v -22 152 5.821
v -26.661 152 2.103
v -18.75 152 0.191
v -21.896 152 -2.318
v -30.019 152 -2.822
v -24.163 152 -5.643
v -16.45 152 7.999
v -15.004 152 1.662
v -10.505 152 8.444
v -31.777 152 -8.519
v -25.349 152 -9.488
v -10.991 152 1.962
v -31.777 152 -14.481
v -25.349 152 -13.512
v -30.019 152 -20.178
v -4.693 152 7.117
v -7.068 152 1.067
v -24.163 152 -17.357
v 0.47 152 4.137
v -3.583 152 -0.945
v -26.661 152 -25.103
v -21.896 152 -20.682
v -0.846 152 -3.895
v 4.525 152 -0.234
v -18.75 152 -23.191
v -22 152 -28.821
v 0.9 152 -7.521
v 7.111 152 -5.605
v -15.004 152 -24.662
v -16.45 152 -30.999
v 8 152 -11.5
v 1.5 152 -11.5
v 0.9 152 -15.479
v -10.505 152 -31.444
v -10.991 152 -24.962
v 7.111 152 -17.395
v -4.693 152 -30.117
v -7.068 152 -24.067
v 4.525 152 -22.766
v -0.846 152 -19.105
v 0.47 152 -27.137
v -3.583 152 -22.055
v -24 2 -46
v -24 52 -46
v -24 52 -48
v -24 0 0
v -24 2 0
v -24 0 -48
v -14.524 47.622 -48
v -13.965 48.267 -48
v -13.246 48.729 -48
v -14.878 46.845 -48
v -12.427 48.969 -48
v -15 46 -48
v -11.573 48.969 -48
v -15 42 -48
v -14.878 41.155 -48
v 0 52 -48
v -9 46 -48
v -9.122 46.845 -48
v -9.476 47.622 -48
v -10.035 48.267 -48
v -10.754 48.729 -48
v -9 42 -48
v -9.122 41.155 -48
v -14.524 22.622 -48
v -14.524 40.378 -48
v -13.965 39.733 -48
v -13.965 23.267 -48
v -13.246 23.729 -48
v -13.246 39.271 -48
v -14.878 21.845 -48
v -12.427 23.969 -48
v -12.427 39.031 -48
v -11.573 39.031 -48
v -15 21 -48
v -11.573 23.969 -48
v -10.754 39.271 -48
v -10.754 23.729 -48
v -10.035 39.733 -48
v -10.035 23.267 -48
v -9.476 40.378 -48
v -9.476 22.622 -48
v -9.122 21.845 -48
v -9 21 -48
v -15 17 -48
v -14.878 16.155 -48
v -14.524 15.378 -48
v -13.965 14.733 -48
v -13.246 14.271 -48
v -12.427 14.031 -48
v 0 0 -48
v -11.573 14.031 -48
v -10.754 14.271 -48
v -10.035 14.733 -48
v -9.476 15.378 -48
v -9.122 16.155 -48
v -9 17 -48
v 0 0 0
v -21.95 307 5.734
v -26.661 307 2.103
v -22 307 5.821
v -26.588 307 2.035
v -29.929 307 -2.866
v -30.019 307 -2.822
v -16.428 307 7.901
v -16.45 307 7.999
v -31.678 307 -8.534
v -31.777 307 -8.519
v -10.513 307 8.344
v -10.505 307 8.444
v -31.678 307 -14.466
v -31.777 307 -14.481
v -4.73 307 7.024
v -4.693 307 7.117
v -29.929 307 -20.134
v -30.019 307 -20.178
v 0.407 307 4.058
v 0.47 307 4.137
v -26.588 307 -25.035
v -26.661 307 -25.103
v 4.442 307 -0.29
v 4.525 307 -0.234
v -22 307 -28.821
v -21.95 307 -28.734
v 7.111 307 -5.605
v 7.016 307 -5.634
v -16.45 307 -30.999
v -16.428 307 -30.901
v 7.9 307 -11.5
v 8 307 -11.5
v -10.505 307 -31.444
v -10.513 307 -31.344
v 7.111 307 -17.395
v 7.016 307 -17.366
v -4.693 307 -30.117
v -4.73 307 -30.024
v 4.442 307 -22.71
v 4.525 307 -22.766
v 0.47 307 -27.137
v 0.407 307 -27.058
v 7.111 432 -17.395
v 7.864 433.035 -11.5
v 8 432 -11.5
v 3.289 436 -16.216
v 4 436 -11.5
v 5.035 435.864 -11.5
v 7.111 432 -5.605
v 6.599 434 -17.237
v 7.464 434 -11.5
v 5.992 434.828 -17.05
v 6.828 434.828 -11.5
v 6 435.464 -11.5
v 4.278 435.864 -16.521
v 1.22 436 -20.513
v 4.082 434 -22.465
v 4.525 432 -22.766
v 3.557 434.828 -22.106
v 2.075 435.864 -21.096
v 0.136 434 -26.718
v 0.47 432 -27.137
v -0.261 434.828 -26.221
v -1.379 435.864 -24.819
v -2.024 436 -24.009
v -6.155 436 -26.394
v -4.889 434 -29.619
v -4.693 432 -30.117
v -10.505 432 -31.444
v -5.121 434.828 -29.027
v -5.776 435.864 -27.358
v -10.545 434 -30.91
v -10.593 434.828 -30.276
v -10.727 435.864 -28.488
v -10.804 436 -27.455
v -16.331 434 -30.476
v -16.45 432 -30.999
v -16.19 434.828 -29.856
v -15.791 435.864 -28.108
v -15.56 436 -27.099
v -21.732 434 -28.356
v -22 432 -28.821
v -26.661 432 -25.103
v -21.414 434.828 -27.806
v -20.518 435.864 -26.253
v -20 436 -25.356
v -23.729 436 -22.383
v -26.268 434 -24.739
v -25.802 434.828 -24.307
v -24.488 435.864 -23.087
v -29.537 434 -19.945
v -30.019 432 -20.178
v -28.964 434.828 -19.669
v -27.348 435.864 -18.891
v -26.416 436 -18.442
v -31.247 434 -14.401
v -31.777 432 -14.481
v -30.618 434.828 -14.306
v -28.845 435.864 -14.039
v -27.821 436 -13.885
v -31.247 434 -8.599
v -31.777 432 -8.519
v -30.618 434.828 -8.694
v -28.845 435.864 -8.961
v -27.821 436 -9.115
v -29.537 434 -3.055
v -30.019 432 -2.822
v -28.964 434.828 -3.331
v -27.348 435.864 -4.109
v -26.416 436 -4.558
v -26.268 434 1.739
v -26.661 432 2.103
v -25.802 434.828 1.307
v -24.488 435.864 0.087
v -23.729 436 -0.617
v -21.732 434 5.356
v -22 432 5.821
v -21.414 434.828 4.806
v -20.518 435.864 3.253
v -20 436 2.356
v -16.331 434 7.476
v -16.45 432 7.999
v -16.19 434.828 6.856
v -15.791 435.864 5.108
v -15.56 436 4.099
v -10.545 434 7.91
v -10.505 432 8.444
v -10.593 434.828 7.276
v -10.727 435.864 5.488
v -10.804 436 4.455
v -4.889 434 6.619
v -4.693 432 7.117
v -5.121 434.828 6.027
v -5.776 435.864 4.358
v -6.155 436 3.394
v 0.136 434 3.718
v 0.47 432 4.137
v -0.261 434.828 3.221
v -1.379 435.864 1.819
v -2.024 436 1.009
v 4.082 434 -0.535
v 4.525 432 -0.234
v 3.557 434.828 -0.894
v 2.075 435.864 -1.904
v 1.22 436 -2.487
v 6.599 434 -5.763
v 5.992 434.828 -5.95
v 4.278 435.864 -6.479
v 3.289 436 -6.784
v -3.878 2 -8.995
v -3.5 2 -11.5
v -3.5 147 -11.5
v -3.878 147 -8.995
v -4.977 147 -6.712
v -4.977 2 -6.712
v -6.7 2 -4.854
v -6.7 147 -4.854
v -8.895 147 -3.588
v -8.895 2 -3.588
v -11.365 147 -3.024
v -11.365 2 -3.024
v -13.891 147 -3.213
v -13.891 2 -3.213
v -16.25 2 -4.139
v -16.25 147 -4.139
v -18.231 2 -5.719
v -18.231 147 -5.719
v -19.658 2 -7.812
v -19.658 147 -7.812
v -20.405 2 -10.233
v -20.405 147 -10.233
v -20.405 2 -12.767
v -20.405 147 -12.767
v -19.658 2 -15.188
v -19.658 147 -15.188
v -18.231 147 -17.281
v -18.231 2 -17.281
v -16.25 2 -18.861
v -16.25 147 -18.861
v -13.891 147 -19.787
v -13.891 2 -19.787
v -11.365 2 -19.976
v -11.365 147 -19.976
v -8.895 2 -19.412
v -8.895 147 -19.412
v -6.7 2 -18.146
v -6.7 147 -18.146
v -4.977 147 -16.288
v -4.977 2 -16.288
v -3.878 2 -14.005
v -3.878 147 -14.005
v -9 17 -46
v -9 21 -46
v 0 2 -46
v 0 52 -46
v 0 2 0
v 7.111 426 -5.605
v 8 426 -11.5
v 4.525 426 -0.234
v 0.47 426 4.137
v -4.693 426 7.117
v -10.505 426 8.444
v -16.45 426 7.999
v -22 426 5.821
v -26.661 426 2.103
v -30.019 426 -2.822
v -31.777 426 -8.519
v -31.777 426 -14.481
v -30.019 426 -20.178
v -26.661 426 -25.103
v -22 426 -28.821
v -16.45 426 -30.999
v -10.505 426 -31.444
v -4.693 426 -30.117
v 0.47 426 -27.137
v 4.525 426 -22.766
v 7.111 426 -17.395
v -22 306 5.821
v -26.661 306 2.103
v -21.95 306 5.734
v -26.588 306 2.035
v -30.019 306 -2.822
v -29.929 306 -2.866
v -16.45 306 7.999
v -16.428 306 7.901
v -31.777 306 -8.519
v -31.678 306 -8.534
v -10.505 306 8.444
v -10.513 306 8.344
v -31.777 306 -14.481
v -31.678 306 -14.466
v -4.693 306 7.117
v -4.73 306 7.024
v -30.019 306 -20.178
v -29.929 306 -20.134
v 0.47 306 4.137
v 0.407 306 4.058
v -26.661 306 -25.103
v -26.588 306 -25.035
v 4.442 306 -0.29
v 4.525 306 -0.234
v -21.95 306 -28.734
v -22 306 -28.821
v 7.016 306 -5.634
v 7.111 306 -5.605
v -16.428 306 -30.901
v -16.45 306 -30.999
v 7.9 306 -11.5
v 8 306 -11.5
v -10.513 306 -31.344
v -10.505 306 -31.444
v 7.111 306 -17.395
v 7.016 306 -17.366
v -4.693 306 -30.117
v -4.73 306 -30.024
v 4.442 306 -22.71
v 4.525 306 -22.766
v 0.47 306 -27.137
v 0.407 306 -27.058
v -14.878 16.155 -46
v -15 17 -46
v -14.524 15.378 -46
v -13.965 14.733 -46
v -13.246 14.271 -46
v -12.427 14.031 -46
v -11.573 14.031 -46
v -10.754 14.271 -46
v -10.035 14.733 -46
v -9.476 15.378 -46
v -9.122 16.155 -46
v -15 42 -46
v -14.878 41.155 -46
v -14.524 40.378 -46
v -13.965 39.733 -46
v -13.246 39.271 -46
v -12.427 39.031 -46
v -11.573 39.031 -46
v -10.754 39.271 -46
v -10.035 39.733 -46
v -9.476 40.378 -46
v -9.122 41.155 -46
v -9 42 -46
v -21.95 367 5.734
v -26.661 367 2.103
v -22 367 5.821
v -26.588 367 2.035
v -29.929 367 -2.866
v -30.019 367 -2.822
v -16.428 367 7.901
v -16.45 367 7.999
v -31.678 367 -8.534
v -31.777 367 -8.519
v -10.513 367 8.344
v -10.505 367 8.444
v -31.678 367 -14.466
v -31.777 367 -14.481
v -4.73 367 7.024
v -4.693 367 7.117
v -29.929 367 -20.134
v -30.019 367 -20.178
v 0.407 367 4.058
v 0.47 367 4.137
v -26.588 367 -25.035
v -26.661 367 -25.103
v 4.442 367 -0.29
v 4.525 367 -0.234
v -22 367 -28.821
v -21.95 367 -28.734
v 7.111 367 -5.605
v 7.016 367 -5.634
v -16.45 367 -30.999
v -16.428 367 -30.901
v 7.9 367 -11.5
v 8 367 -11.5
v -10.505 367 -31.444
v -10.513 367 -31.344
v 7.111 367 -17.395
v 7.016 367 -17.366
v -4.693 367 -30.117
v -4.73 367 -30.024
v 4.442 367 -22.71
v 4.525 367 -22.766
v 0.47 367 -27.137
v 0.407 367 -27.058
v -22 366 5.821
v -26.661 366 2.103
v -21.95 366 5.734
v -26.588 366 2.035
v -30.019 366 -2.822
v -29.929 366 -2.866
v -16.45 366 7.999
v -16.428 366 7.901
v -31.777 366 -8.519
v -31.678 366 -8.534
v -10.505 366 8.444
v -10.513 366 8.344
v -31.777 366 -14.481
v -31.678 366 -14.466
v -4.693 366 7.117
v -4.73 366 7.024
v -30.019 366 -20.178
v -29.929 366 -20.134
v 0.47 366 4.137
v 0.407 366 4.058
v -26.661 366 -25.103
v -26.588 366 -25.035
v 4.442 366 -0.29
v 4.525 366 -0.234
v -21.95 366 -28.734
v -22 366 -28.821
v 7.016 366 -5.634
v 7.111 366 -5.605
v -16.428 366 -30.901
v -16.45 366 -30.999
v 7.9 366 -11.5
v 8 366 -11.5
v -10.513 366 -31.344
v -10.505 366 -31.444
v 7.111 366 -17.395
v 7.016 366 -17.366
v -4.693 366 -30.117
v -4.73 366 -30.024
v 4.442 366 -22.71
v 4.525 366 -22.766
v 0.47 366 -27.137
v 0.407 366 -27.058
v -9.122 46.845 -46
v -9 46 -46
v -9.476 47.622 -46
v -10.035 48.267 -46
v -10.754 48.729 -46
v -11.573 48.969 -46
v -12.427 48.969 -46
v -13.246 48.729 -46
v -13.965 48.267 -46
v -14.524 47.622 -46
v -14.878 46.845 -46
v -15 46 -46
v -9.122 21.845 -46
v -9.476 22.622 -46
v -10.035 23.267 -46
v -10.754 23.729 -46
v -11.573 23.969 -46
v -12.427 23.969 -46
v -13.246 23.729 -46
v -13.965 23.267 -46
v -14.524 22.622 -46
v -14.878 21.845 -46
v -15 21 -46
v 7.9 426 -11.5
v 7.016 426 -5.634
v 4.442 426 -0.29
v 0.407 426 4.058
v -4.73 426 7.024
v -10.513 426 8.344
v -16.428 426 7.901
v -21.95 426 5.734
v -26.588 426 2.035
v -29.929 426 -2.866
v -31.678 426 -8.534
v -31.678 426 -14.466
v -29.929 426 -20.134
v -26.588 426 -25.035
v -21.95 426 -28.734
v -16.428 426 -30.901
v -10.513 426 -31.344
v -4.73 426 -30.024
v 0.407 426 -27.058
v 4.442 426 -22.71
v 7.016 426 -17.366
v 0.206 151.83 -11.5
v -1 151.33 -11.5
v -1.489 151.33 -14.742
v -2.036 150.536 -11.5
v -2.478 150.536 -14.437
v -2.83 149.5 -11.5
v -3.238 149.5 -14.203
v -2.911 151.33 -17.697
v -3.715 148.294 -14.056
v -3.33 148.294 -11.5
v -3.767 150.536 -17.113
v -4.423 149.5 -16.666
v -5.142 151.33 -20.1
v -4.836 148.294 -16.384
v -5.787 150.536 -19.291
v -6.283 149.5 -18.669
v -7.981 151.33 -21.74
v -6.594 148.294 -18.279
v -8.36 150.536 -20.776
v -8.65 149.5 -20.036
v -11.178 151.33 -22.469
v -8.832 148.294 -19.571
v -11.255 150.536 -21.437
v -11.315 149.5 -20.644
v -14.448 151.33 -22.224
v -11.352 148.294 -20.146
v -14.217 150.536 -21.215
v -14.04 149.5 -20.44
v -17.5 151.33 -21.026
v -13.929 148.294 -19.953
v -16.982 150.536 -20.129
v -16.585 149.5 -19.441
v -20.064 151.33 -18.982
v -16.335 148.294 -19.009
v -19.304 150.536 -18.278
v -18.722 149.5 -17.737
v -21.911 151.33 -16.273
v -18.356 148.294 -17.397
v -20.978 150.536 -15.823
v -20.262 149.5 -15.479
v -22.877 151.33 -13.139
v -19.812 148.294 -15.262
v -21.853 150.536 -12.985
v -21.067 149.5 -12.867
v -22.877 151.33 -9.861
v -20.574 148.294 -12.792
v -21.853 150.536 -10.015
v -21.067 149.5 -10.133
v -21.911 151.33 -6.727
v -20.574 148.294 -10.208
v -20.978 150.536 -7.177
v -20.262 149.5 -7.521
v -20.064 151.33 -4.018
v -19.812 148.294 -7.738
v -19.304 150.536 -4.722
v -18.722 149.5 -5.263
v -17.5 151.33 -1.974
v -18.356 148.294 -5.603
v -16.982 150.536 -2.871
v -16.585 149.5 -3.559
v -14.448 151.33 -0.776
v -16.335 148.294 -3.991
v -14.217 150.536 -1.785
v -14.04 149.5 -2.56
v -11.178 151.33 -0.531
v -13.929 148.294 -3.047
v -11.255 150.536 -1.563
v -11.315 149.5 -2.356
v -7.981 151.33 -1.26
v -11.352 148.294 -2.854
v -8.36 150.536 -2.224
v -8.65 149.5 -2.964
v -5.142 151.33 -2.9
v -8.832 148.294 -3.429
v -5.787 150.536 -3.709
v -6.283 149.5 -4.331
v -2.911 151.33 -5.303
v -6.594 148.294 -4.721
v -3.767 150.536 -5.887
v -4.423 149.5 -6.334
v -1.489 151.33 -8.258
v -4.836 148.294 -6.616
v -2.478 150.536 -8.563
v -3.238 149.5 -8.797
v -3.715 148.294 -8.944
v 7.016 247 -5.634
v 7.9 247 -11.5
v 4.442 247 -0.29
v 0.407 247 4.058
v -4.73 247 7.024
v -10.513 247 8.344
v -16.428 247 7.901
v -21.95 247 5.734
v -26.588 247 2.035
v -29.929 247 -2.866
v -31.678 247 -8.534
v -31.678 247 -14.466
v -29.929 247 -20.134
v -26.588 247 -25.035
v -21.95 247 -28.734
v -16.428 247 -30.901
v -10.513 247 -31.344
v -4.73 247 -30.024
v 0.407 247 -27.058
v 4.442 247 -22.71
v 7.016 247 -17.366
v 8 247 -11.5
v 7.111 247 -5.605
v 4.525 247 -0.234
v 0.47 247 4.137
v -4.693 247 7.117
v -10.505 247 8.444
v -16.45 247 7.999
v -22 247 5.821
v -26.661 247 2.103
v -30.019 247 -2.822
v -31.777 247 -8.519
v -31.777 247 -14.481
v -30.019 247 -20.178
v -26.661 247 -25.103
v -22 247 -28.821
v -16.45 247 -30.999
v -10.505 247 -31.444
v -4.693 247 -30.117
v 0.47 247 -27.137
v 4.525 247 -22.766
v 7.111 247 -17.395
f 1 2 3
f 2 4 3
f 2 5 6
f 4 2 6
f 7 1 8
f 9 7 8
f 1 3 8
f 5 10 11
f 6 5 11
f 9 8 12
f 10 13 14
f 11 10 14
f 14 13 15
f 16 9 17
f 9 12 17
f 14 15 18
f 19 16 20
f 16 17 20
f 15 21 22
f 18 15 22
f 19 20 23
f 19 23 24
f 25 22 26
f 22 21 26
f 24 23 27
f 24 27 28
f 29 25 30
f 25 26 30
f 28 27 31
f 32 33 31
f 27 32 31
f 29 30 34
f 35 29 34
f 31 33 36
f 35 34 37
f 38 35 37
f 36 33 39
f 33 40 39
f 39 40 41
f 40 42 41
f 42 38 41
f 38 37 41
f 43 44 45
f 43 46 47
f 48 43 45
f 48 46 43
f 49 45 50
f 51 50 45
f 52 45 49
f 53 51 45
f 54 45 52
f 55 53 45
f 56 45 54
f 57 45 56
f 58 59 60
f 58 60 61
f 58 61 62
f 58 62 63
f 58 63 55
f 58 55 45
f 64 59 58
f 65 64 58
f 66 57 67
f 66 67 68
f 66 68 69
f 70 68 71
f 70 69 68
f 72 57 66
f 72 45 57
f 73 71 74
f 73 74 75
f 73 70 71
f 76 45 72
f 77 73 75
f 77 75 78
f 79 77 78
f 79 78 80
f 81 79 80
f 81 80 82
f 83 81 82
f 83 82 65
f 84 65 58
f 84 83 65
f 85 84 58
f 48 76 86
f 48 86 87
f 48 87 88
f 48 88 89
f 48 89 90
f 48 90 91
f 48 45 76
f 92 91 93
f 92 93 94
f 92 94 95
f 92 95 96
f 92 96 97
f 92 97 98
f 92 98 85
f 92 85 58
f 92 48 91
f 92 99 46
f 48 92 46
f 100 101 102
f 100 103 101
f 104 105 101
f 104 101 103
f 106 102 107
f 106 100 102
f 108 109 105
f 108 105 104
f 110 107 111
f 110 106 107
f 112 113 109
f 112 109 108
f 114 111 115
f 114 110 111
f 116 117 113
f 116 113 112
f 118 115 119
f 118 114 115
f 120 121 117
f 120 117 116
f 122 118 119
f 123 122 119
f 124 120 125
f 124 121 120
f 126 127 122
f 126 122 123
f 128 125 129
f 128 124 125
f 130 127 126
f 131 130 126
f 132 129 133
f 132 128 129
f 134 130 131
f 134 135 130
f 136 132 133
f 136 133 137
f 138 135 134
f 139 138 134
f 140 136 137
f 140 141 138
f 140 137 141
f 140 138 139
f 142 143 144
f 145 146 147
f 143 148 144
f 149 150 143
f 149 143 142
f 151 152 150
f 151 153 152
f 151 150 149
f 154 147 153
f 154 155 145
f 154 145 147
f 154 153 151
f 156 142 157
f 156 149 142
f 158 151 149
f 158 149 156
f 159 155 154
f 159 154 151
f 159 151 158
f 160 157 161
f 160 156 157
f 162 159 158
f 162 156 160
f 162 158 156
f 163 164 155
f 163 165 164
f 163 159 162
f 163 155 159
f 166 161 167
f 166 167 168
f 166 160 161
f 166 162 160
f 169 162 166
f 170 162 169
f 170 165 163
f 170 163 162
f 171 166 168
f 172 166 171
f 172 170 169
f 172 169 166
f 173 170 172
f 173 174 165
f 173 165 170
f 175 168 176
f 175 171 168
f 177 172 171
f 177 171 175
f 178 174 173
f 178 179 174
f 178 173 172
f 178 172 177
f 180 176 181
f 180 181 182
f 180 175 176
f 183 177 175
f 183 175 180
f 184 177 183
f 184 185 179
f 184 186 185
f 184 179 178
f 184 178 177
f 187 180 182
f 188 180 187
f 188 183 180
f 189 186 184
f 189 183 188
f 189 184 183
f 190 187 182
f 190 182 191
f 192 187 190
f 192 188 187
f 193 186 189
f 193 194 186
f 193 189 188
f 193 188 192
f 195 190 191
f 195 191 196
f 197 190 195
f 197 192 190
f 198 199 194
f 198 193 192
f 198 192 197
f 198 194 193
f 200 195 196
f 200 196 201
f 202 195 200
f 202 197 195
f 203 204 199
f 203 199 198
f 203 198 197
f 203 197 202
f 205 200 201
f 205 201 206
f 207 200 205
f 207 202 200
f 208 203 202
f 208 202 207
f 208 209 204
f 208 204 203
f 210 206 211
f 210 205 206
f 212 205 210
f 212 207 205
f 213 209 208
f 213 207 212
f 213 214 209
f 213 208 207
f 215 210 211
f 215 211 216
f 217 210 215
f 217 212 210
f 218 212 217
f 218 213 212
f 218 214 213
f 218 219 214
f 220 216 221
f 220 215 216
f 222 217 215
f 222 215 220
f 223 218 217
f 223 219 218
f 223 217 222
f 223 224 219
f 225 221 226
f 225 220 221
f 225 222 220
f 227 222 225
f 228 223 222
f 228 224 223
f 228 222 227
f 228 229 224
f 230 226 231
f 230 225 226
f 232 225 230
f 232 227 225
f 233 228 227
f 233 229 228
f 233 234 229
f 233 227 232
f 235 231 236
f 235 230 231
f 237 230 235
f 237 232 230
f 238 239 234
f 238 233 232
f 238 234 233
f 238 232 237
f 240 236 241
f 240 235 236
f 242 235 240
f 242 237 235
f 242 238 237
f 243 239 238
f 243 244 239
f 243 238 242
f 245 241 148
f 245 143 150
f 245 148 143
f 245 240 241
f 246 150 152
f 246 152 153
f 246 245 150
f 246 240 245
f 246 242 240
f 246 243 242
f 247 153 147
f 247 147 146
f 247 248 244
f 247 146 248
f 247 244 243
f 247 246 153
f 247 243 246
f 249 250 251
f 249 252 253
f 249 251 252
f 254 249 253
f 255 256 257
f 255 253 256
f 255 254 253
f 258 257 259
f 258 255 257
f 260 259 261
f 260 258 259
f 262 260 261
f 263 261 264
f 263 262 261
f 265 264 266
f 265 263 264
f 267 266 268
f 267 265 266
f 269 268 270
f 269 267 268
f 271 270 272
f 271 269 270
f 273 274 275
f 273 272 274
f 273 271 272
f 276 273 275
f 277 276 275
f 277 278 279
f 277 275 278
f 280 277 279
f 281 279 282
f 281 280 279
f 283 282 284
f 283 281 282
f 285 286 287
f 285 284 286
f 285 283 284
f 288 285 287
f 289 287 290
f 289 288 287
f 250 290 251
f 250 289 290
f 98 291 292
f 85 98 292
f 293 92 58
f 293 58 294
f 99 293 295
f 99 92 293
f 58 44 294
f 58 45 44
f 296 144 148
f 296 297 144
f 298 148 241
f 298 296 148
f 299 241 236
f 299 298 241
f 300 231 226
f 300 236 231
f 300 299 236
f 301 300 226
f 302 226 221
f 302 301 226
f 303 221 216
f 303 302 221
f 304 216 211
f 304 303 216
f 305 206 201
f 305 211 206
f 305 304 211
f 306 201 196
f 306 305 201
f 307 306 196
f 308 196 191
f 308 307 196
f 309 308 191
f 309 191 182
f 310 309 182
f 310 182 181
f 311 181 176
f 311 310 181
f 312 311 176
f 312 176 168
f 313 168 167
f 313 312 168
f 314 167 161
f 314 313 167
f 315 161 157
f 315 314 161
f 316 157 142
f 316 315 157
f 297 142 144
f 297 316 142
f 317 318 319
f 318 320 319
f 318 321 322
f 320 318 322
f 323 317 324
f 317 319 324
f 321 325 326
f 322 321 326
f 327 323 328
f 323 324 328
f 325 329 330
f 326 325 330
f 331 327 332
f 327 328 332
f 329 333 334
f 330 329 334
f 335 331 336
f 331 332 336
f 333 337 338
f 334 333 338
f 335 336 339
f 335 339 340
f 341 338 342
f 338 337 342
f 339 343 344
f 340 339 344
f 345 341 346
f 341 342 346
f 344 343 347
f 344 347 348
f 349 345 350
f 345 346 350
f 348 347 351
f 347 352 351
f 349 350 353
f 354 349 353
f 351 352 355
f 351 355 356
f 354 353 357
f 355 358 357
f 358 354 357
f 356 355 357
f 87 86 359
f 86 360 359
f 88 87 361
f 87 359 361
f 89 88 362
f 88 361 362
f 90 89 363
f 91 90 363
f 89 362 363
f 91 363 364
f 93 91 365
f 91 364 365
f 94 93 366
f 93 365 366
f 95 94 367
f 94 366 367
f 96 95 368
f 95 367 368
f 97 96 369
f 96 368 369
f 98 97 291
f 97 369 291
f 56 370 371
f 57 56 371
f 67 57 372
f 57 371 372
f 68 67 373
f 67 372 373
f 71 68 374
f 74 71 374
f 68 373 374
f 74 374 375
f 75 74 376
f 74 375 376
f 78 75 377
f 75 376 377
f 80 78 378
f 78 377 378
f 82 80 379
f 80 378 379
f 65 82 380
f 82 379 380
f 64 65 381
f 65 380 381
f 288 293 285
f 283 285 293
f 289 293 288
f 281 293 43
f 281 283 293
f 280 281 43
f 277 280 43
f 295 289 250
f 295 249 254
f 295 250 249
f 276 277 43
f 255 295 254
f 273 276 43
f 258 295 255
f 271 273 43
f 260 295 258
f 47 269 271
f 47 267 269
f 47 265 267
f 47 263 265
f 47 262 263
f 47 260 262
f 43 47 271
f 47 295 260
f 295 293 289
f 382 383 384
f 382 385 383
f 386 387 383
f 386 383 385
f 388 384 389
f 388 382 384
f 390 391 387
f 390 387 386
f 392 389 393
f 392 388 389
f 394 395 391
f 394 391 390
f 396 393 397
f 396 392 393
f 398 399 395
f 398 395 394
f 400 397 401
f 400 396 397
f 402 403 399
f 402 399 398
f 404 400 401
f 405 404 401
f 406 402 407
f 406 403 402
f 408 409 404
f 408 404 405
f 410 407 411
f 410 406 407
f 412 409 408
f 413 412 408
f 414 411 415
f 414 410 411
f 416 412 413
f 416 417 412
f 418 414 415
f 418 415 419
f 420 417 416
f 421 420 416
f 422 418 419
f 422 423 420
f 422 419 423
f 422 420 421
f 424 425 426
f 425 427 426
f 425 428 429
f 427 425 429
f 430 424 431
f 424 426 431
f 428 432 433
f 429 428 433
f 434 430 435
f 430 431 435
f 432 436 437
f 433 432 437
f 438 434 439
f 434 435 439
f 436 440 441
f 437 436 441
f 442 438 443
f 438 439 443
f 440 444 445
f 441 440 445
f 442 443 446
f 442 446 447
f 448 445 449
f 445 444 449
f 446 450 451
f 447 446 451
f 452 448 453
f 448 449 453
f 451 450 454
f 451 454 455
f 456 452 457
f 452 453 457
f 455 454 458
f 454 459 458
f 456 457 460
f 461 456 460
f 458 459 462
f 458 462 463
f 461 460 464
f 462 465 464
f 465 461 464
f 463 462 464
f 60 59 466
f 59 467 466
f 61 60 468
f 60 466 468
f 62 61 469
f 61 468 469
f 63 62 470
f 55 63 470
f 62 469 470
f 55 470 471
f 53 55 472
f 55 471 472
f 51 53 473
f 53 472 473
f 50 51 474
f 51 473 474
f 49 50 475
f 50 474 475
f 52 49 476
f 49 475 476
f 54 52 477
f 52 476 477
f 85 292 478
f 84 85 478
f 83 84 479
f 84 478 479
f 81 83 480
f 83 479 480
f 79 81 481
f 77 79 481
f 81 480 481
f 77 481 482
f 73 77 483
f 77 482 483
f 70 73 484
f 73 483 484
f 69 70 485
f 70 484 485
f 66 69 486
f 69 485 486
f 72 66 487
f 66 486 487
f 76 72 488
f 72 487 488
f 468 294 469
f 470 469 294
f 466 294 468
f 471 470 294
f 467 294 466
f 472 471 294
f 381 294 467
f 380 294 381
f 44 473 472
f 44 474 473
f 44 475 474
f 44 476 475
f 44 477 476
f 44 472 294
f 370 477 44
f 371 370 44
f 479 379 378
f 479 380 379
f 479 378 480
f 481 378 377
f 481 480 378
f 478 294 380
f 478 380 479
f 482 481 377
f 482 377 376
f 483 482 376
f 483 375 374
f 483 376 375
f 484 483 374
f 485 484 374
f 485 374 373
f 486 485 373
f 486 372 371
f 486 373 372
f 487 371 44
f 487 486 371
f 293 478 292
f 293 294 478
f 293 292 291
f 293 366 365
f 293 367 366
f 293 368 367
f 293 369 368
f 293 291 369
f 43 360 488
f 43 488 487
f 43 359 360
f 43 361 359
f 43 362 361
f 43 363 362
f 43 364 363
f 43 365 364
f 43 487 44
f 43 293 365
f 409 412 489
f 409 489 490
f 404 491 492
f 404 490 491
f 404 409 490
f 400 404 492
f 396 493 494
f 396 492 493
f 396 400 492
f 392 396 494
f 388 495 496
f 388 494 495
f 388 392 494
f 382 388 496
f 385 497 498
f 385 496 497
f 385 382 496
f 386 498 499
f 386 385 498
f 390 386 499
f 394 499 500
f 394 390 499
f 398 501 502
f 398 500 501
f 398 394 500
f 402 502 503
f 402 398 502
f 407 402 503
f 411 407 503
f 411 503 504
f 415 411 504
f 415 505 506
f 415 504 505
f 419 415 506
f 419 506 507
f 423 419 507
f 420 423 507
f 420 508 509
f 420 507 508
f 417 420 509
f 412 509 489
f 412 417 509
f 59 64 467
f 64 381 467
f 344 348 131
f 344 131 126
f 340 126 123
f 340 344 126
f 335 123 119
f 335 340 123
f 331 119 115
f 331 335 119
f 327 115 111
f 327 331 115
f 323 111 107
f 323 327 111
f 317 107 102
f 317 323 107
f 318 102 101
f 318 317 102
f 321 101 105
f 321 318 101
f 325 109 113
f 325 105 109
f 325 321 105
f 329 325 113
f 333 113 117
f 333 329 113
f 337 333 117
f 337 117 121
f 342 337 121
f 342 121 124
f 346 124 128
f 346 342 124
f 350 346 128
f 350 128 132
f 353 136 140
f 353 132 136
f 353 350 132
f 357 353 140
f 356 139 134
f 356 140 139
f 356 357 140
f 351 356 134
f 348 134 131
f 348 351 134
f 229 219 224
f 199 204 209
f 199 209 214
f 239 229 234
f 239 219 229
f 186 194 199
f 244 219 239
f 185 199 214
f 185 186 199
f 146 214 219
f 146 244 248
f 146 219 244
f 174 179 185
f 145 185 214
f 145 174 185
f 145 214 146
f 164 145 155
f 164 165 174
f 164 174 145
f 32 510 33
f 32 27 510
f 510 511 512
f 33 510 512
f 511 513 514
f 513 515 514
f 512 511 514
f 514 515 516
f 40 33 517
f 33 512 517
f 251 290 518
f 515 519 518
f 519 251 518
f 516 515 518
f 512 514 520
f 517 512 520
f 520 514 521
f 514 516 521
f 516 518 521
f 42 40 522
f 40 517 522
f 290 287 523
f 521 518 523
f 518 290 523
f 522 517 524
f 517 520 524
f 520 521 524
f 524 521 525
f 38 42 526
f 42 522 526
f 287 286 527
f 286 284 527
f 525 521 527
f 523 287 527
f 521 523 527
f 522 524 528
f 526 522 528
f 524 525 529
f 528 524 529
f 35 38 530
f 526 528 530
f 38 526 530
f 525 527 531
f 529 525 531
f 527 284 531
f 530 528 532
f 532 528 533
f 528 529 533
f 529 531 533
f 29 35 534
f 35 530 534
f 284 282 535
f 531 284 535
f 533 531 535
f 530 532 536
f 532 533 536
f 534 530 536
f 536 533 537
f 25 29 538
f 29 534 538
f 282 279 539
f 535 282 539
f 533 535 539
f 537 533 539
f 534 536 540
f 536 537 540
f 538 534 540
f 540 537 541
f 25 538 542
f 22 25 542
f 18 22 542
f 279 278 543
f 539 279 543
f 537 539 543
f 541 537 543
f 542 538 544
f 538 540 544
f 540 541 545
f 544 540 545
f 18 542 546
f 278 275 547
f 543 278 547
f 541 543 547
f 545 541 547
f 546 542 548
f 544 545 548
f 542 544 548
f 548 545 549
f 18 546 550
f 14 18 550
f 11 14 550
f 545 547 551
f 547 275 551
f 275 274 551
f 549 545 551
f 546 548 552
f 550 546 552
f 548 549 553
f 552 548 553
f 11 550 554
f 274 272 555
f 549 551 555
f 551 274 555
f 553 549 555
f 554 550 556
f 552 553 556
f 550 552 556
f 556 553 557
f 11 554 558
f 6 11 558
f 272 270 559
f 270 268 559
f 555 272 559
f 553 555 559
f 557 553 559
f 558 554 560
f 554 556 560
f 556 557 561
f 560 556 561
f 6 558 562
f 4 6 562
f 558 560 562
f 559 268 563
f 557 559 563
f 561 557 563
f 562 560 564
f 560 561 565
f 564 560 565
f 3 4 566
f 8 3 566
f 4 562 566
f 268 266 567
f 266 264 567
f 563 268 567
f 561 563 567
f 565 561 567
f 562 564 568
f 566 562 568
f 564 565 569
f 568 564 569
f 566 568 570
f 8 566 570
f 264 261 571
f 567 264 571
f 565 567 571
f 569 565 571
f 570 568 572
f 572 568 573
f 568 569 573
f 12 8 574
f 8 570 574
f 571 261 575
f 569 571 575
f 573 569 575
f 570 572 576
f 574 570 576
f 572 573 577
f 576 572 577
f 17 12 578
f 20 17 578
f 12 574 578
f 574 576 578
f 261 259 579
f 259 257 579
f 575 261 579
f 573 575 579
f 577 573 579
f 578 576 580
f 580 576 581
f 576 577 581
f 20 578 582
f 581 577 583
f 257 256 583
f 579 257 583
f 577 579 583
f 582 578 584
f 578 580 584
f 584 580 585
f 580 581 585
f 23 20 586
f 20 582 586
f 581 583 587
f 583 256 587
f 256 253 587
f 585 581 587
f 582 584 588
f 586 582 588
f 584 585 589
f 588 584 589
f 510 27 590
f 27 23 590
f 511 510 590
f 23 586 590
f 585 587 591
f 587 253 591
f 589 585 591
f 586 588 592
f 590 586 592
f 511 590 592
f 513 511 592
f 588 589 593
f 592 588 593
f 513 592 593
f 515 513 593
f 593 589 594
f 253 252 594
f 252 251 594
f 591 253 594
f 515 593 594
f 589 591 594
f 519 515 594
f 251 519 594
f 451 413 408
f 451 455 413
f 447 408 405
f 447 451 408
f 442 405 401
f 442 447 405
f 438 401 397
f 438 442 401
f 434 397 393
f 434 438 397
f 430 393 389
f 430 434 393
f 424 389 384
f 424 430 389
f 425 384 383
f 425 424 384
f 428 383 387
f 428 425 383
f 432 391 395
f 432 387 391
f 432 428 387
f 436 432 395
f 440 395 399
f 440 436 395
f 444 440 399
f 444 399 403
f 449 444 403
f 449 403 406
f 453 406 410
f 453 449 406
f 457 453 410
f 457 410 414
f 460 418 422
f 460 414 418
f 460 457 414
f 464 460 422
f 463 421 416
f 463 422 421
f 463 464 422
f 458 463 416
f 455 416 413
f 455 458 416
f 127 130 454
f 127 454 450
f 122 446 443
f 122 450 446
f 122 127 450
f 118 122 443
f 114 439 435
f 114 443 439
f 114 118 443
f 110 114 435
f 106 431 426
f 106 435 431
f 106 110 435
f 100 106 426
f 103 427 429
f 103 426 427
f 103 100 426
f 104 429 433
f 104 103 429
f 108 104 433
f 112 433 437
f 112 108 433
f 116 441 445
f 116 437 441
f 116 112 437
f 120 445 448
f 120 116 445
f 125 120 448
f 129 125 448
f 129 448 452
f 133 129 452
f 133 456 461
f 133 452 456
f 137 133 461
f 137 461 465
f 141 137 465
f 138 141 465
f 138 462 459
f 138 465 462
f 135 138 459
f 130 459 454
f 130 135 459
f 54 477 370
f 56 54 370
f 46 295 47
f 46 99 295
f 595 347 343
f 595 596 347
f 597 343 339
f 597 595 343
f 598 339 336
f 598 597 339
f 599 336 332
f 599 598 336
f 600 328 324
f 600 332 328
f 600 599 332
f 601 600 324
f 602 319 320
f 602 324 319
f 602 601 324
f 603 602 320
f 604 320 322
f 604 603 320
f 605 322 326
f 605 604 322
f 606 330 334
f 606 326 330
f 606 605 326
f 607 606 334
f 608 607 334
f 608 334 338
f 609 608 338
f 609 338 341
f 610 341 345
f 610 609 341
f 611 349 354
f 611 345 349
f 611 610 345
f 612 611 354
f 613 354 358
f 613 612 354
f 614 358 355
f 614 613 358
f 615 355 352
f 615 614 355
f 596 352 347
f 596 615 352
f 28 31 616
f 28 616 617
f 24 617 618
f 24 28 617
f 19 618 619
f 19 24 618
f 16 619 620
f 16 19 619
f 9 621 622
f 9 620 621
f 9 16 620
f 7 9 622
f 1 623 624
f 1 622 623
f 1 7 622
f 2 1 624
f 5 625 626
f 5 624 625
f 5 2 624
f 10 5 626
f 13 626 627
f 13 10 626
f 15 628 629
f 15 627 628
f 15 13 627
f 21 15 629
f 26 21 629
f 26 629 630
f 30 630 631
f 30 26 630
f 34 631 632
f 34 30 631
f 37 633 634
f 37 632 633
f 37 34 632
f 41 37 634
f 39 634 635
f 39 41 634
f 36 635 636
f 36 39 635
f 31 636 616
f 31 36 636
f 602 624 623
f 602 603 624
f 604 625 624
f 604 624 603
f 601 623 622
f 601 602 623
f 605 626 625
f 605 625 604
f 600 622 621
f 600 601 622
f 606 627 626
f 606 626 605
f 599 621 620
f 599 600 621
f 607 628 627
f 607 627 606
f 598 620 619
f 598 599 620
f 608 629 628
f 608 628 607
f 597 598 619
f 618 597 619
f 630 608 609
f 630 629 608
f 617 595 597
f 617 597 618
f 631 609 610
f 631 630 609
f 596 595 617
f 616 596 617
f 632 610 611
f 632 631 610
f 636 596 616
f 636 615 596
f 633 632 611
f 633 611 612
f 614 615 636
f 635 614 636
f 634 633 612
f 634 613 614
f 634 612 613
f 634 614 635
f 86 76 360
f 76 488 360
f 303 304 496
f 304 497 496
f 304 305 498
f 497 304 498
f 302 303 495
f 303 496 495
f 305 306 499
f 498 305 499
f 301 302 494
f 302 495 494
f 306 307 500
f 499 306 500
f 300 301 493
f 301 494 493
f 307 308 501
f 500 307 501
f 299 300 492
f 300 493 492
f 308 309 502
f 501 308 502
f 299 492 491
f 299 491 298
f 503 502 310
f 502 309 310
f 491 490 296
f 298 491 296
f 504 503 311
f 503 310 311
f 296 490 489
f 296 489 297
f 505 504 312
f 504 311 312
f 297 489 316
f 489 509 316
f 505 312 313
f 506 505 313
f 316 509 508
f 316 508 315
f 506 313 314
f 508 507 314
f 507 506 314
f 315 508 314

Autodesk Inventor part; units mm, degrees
ref_plane "YZ Plane" through (0, 0, 0) normal (1, 0, 0) x (0, 1, 0)
ref_plane "XZ Plane" through (0, 0, 0) normal (0, 1, 0) x (-1, 0, 0)
ref_plane "XY Plane" through (0, 0, 0) normal (0, 0, 1) x (1, 0, 0)
sketch "Sketch1" plane through (0, 0, 0) normal (0, 1, 0) x (-1, 0, 0)
  line L0 (0, 0) -> (24, 0)
  line L1 (24, 0) -> (24, -48)
  line L2 (24, -48) -> (0, -48)
  line L3 (0, -48) -> (0, 0)
  line L4 (12, 0) -> (12, -48) construction
  circle A0 centre (12, -12) radius 9 construction
  dimension "d0" = 18
  dimension "d1" = 3
  dimension "d2" = 3
  dimension "d3" = 48
extrude "Extrusion1" add sketch "Sketch1" along normal blind 2
sketch "Sketch2" plane through (0, 2, 0) normal (0, 1, 0) x (1, 0, 0)
  line L0 (-24, 48) -> (-24, 0) projected
  line L1 (0, 0) -> (0, 48) projected
  line L2 (-24, 48) -> (0, 48)
  line L3 (0, 48) -> (0, 46)
  line L4 (0, 46) -> (-24, 46)
  line L5 (-24, 46) -> (-24, 48)
  dimension "d6" = 2
extrude "Extrusion2" add sketch "Sketch2" along normal blind 50
sketch "Sketch3" plane through (-24, 2, -46) normal (0, 0, 1) x (1, 0, 0)
  line L0 (24, 50) -> (0, 50) construction
  line L1 (12, 50) -> (12, 0) construction
  line L2 (0, 0) -> (24, 0) construction
  line L3 (12, 47) -> (12, 37) construction
  line L4 (9, 44) -> (9, 40)
  line L5 (15, 40) -> (15, 44)
  arc A0 (15, 44) -> (9, 44) centre (12, 44) ccw
  arc A1 (9, 40) -> (15, 40) centre (12, 40) ccw
  line L6 (12, 22) -> (12, 12) construction
  line L7 (9, 19) -> (9, 15)
  line L8 (15, 15) -> (15, 19)
  arc A2 (15, 19) -> (9, 19) centre (12, 19) ccw
  arc A3 (9, 15) -> (15, 15) centre (12, 15) ccw
  point P0 (24, -2)
  point P1 (12, 42)
  point P2 (12, 17)
  dimension "d9" = 6
  dimension "d10" = 10
  dimension "d11" = 3
  dimension "d12" = 10
  dimension "d13" = 6
  dimension "d14" = 15
extrude "Extrusion3" cut sketch "Sketch3" against normal up to next
sketch "Sketch4" plane through (0, 2, 0) normal (0, 1, 0) x (1, 0, 0)
  line L0 (-24, 0) -> (0, 0) construction
  line L1 (-12, 0) -> (-12, 46) construction
  line L2 (-9, 46) -> (-15, 46) construction
  circle A0 centre (-12, 11.5) radius 8.5
  dimension "d17" = 17
  dimension "d18" = 3
extrude "Extrusion4" add sketch "Sketch4" along normal blind 150
sketch "Sketch5" plane through (-12, 152, -11.5) normal (0, 1, 0) x (1, 0, 0)
  circle A0 centre (0, 0) radius 8.5 projected
  circle A1 centre (0, 0) radius 20
  point P0 (12, -11.5)
  dimension "d21" = 40
extrude "Extrusion5" add sketch "Sketch5" along normal blind 95 contours A0 | A1
sketch "Sketch6" plane through (-12, 247, -11.5) normal (0, 1, 0) x (1, 0, 0)
  circle A0 centre (0, 0) radius 20 projected
  circle A1 centre (0, 0) radius 19.9
  point P0 (12, -11.5)
  dimension "d24" = 0.1
sketch "Sketch6 outline for Extrusion6" plane through (-12, 247, -11.5) normal (0, 1, 0) x (1, 0, 0)
  circle A0 centre (0, 0) radius 19.9
extrude "Extrusion6" add sketch "Sketch6 outline for Extrusion6" along normal blind 59
sketch "Sketch7" plane through (-12, 306, -11.5) normal (0, 1, 0) x (1, 0, 0)
  circle A0 centre (0, 0) radius 19.9 projected
  circle A1 centre (0, 0) radius 20
  point P0 (12, -11.5)
  dimension "d27" = 0.1
extrude "Extrusion7" add sketch "Sketch7" along normal blind 1 contours A0 | A1
sketch "Sketch8" plane through (-12, 307, -11.5) normal (0, 1, 0) x (1, 0, 0)
  circle A0 centre (0, 0) radius 19.9 projected
  point P0 (12, -11.5)
extrude "Extrusion8" add sketch "Sketch8" along normal blind 59
sketch "Sketch9" plane through (-12, 366, -11.5) normal (0, 1, 0) x (1, 0, 0)
  circle A0 centre (0, 0) radius 19.9 projected
  circle A1 centre (0, 0) radius 20 projected
  point P0 (12, -11.5)
extrude "Extrusion9" add sketch "Sketch9" along normal blind 1 contours A0 | A1
sketch "Sketch10" plane through (-12, 367, -11.5) normal (0, 1, 0) x (1, 0, 0)
  circle A0 centre (0, 0) radius 19.9 projected
  point P0 (12, -11.5)
extrude "Extrusion10" add sketch "Sketch10" along normal blind 59
sketch "Sketch11" plane through (-12, 426, -11.5) normal (0, 1, 0) x (1, 0, 0)
  circle A0 centre (0, 0) radius 20 projected
  point P0 (12, -11.5)
extrude "Extrusion11" add sketch "Sketch11" along normal blind 10
fillet "Fillet1" radius 4 1 edges at (-32, 436, -11.5)
fillet "Fillet2" radius 5 1 edges at (-20.5, 152, -11.5)
equation "\"d2\" = d1"
properties part number "Signal Tower"
